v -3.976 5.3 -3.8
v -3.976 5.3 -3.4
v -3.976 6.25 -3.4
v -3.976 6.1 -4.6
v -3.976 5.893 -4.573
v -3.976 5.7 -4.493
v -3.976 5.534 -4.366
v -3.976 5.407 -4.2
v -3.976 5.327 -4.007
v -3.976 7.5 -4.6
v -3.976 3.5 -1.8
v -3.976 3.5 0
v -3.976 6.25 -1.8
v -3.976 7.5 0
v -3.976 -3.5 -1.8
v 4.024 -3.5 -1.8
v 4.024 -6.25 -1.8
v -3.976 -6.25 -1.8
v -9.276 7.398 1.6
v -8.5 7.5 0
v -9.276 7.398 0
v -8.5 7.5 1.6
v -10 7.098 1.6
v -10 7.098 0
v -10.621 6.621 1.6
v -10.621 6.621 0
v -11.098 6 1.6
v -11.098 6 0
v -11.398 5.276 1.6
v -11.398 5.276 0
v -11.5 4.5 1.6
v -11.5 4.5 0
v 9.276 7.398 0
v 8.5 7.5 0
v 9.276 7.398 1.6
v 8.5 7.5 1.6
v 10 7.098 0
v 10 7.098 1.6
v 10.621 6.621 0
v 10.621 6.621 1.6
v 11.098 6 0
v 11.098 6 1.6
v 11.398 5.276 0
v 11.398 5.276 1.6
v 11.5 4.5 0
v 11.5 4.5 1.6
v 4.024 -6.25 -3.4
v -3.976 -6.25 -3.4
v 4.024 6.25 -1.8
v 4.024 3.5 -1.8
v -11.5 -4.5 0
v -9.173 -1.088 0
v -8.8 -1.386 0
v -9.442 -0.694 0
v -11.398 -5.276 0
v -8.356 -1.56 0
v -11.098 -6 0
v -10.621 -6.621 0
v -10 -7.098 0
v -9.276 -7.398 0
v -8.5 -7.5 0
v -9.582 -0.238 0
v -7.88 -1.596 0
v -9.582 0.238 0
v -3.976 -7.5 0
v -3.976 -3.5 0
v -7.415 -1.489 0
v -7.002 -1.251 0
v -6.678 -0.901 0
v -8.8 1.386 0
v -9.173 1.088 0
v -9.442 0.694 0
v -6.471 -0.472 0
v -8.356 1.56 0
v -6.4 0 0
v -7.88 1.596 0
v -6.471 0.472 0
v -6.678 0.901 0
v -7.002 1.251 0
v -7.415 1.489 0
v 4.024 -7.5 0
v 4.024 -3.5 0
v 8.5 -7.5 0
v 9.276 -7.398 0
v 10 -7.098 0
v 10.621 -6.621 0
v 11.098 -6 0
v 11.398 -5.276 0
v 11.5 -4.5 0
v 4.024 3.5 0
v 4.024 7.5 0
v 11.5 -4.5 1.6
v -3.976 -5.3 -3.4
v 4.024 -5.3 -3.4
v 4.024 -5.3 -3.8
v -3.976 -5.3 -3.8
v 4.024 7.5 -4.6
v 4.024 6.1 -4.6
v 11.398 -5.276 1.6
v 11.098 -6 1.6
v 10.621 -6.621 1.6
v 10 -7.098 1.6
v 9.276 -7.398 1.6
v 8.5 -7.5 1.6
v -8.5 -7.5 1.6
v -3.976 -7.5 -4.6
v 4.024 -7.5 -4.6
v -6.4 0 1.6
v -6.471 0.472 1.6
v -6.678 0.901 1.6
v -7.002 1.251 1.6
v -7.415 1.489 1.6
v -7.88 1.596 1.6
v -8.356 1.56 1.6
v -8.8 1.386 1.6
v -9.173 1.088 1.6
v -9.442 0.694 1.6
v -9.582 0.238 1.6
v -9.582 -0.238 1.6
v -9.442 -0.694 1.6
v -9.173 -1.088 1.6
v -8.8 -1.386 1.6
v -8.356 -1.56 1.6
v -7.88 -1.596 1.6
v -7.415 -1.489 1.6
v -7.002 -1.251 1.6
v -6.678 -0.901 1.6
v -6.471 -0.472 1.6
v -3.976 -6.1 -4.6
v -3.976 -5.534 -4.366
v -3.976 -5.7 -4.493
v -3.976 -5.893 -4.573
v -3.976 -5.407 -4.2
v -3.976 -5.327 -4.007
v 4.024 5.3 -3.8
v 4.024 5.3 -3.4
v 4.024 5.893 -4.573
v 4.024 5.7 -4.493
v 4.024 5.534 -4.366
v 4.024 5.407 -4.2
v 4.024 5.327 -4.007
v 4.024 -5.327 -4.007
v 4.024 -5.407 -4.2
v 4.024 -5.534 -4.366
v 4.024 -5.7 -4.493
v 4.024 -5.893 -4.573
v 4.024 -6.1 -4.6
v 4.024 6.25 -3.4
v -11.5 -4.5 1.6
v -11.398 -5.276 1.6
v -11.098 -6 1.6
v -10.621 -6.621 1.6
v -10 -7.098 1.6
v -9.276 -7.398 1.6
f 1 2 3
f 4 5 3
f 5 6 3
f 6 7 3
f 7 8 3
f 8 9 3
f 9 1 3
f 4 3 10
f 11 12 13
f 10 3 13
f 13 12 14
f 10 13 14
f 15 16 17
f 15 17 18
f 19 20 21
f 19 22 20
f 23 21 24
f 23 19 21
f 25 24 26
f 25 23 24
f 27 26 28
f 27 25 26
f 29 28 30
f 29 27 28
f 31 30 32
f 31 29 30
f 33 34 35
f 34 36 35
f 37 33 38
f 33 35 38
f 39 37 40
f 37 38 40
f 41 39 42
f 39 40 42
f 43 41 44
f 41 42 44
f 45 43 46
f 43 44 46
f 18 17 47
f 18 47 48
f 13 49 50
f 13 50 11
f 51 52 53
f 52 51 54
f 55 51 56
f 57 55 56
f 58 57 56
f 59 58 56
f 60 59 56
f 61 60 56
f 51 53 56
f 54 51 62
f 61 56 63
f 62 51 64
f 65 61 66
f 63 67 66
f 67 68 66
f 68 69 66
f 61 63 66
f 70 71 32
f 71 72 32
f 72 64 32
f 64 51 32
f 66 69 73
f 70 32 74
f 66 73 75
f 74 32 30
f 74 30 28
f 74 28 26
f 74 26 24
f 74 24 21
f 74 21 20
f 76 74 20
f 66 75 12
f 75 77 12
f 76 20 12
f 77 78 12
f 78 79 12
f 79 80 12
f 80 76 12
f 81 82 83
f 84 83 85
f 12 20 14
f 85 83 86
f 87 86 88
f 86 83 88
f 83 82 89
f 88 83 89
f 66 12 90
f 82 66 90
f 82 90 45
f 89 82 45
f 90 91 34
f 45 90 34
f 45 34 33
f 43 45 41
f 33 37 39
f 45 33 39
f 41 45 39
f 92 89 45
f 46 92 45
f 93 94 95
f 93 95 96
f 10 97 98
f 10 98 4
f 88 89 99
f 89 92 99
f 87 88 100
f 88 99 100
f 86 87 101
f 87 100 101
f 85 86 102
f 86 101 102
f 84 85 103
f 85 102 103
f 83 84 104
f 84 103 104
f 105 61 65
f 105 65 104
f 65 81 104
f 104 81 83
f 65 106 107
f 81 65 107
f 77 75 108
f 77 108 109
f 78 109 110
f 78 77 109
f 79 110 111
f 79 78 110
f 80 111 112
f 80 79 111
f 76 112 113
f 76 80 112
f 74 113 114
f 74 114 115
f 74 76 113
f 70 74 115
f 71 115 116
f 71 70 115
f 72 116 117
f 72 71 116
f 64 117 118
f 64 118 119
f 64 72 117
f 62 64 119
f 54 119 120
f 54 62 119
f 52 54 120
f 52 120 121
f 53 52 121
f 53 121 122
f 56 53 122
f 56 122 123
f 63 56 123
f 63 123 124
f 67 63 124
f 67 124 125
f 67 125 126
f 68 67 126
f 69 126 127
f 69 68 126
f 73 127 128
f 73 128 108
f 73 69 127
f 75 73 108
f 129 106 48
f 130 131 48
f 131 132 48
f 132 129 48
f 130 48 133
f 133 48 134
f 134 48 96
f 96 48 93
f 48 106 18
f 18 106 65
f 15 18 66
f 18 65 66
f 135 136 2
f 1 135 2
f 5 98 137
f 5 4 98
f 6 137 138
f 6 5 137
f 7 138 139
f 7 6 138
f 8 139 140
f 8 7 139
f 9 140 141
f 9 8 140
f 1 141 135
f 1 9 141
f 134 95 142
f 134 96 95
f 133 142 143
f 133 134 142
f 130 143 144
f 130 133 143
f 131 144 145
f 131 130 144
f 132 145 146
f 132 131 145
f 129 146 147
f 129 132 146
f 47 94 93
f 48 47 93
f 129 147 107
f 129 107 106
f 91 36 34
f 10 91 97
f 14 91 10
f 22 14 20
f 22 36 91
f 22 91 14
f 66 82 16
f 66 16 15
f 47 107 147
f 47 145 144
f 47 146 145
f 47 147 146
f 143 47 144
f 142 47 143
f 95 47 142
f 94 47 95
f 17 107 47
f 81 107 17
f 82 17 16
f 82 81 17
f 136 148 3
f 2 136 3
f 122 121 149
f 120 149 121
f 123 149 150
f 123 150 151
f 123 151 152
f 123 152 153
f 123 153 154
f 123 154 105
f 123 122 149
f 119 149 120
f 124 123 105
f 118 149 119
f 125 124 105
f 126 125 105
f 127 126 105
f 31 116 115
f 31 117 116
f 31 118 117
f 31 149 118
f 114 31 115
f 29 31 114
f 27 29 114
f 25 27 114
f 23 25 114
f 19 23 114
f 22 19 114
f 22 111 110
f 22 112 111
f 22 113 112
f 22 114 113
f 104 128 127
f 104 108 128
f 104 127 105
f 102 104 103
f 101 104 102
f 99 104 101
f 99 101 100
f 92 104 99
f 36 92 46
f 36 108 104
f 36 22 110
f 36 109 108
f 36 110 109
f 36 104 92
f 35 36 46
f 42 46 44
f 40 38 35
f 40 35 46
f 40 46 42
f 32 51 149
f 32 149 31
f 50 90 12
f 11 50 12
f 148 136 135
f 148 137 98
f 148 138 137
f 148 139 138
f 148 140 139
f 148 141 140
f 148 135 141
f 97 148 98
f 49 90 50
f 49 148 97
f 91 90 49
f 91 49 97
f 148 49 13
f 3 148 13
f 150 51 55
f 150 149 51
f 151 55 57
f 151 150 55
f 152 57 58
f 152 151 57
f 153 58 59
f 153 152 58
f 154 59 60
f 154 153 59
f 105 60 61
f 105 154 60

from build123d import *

# Parameters (mm, degrees)
SKETCH_1_W      = 23
SKETCH_1_H      = 15
SKETCH_1_R      = 1.6
EXTRUDE_1_DEPTH = 1.6
SKETCH_2_W      = 8
SKETCH_2_H      = 4
EXTRUDE_2_DEPTH = 1.8
SKETCH_4_W      = 8
SKETCH_4_H      = 1.25
EXTRUDE_3_DEPTH = 1.6
SKETCH_5_W      = 8
SKETCH_5_H      = 2.2
EXTRUDE_4_DEPTH = 1.2
FILLET_1_R      = 0.8
FILLET_2_R      = 3


with BuildPart() as part:
    # 草图1 → 凸台-拉伸1 (new body)
    with BuildSketch(Plane.XY):
        Rectangle(SKETCH_1_W, SKETCH_1_H)
        with Locations((-8, 0)):
            Circle(SKETCH_1_R, mode=Mode.SUBTRACT)
    extrude(amount=EXTRUDE_1_DEPTH)

    # 草图2 → 凸台-拉伸2 (add)
    with BuildSketch(Plane(origin=(0, 0, 0), x_dir=(-1, 0, 0), z_dir=(0, 0, -1))):
        with Locations((-0.023575702, 5.5)):
            Rectangle(SKETCH_2_W, SKETCH_2_H)
        with Locations((-0.023575702, -5.5)):
            Rectangle(SKETCH_2_W, SKETCH_2_H)
    extrude(amount=EXTRUDE_2_DEPTH)

    # 草图4 → 凸台-拉伸3 (add)
    with BuildSketch(Plane(origin=(0, 0, -1.8), x_dir=(-1, 0, 0), z_dir=(0, 0, -1))):
        with Locations((-0.023575702, 6.875)):
            Rectangle(SKETCH_4_W, SKETCH_4_H)
        with Locations((-0.023575702, -6.875)):
            Rectangle(SKETCH_4_W, SKETCH_4_H)
    extrude(amount=EXTRUDE_3_DEPTH)

    # 草图5 → 凸台-拉伸4 (add)
    with BuildSketch(Plane(origin=(0, 0, -3.4), x_dir=(-1, 0, 0), z_dir=(0, 0, -1))):
        with Locations((-0.023575702, 6.4)):
            Rectangle(SKETCH_5_W, SKETCH_5_H)
        with Locations((-0.023575702, -6.4)):
            Rectangle(SKETCH_5_W, SKETCH_5_H)
    extrude(amount=EXTRUDE_4_DEPTH)

    # 圆角1
    fillet_1_edges = [part.edges().sort_by_distance(p)[0] for p in [
        (0.023575702, 5.3, -4.6),
        (0.023575702, -5.3, -4.6),
    ]]
    fillet(fillet_1_edges, radius=FILLET_1_R)

    # 圆角2
    fillet_2_edges = [part.edges().sort_by_distance(p)[0] for p in [
        (-11.5, 7.5, 0.8),
        (11.5, 7.5, 0.8),
        (11.5, -7.5, 0.8),
        (-11.5, -7.5, 0.8),
    ]]
    fillet(fillet_2_edges, radius=FILLET_2_R)


solid = part.part
